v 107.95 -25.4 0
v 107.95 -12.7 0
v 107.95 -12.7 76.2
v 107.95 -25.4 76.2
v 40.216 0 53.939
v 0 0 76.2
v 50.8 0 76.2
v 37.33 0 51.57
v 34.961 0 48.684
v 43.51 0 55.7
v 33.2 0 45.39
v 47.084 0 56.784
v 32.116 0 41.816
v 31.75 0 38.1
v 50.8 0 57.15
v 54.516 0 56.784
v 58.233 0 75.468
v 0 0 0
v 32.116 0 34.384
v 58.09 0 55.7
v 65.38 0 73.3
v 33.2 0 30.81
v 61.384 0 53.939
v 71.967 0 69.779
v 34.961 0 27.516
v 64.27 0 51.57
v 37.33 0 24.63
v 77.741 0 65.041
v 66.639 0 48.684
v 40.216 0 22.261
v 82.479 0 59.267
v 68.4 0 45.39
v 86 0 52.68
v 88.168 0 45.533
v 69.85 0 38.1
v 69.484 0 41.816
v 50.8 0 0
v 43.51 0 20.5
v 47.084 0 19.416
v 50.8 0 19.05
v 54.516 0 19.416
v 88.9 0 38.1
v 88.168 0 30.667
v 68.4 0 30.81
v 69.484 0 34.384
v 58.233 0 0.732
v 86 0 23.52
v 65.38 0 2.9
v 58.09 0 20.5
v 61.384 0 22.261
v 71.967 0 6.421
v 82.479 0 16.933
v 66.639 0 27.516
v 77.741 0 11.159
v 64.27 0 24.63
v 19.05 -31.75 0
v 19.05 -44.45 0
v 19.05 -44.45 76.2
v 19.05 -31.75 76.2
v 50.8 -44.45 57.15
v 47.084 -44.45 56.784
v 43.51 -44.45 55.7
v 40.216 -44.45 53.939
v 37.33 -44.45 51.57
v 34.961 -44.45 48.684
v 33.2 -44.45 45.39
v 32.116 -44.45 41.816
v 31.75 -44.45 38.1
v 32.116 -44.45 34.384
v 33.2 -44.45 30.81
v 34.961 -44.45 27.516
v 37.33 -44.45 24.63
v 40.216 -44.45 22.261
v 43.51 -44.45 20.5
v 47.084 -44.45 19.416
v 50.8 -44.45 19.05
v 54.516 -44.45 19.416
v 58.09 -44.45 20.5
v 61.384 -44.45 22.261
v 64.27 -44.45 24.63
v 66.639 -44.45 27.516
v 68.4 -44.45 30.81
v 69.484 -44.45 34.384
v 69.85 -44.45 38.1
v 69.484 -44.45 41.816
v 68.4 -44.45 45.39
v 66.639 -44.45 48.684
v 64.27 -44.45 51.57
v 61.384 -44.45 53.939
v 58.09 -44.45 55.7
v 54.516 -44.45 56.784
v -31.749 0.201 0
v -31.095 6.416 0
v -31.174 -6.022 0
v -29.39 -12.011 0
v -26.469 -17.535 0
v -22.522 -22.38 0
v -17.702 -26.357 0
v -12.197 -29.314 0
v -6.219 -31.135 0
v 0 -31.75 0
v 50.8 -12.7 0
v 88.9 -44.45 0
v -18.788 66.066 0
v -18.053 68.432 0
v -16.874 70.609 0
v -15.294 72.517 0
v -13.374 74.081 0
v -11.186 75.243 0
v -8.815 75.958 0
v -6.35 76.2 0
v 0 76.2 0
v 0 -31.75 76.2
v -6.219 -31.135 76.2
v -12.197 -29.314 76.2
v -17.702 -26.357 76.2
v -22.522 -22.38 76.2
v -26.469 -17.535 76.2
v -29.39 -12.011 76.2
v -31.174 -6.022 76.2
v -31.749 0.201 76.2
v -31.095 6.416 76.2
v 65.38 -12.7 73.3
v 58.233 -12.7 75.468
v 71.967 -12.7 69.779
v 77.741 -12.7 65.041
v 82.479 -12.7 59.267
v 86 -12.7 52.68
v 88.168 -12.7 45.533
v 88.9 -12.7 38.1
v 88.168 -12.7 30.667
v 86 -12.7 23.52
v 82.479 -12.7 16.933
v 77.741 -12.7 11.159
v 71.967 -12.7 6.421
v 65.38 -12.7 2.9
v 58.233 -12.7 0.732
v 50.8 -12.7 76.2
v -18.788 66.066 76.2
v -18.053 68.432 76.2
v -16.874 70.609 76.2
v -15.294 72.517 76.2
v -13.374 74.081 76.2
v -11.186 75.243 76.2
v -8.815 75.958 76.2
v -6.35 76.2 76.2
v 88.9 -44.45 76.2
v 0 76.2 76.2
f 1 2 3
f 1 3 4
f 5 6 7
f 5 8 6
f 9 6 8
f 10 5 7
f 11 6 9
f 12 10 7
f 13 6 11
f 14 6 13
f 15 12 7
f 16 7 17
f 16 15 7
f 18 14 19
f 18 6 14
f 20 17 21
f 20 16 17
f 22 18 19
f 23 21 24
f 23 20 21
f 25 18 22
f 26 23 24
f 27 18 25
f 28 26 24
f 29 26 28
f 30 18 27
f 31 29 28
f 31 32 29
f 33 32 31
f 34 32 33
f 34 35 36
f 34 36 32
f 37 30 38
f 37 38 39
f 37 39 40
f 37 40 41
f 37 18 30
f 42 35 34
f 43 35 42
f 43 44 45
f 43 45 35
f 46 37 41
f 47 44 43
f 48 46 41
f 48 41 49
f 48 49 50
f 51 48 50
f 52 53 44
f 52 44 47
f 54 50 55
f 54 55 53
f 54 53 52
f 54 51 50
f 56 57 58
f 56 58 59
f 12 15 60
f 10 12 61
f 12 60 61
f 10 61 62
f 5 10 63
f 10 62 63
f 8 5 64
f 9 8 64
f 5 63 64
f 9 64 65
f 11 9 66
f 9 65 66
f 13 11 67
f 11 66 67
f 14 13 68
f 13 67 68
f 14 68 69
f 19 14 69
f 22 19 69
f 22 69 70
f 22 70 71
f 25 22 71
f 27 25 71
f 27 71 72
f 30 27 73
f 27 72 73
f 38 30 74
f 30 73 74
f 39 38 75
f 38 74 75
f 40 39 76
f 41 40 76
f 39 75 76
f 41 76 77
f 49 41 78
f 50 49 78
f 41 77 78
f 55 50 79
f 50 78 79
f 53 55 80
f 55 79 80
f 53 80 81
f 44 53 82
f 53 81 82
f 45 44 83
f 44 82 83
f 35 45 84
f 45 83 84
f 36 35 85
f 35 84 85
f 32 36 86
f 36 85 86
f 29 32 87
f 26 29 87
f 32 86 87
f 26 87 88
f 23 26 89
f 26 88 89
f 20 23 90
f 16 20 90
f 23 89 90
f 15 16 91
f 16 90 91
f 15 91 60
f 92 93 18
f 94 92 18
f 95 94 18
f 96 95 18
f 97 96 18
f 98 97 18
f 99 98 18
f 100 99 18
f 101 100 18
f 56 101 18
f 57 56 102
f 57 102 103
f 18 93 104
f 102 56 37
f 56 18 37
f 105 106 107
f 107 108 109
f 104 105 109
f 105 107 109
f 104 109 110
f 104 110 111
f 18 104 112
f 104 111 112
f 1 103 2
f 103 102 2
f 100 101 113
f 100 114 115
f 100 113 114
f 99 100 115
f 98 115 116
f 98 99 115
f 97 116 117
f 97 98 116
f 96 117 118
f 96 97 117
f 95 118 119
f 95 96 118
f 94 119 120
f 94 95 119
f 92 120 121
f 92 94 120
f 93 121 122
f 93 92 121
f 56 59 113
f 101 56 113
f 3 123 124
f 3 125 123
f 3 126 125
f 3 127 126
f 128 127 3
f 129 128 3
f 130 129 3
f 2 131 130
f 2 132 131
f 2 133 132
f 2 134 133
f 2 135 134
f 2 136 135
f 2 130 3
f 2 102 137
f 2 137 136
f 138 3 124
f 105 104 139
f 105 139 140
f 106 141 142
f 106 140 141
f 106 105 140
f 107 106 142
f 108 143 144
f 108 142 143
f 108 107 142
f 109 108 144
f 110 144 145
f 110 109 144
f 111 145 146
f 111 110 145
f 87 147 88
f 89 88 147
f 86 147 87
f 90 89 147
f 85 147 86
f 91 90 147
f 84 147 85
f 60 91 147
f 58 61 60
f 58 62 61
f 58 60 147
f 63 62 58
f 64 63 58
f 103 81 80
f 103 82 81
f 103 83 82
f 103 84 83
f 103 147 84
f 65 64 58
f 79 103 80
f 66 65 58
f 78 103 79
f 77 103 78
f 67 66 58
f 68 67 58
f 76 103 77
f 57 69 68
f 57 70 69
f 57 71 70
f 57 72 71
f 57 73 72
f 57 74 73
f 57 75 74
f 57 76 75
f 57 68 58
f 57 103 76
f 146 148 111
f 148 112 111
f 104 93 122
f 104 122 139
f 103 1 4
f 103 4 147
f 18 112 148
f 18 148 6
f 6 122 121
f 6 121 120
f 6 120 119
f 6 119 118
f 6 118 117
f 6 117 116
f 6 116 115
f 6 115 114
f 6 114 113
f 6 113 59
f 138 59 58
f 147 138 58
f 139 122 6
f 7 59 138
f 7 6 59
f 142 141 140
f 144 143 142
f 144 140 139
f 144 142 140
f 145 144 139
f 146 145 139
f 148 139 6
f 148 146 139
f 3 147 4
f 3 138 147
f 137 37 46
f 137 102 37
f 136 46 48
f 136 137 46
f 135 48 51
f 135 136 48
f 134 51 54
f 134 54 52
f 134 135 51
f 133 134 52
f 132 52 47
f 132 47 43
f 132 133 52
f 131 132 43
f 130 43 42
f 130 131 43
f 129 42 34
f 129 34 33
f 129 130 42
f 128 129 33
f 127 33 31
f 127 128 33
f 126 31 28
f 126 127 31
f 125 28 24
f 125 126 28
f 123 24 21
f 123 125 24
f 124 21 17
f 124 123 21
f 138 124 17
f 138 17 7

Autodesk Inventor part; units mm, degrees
ref_plane "YZ Plane" through (0, 0, 0) normal (1, 0, 0) x (0, 1, 0)
ref_plane "XZ Plane" through (0, 0, 0) normal (0, 1, 0) x (-1, 0, 0)
ref_plane "XY Plane" through (0, 0, 0) normal (0, 0, 1) x (1, 0, 0)
sketch "Sketch1" plane through (0, 0, 0) normal (0, 0, 1) x (1, 0, 0)
  line L0 (0, 76.2) -> (0, 0)
  line L1 (0, 0) -> (50.8, 0)
  line L2 (50.8, 0) -> (50.8, -12.7)
  line L3 (50.8, -12.7) -> (107.95, -12.7)
  line L4 (107.95, -12.7) -> (107.95, -25.4)
  line L5 (107.95, -25.4) -> (88.9, -44.45)
  line L6 (88.9, -44.45) -> (19.05, -44.45)
  line L7 (0, 76.2) -> (-6.35, 76.2)
  circle A0 centre (-6.35, 63.5) radius 12.7
  circle A1 centre (0, 0) radius 31.75
  line L8 (19.05, -44.45) -> (19.05, -31.75)
  line L9 (-31.0951, 6.4155) -> (-18.788, 66.0662)
  line L10 (19.05, -31.75) -> (0, -31.75)
  point P0 (0, 74.4985)
  dimension "d0" = 6.35
  dimension "d1" = 69.85
  dimension "d2" = 12.7
  dimension "d3" = 76.2
  dimension "d4" = 63.5
  dimension "d5" = 19.05
  dimension "d7" = 31.75
  dimension "d8" = 107.95
  dimension "d9" = 25.4
  dimension "d10" = 12.7
  dimension "d11" = 50.8
  dimension "d12" = 44.45
extrude "Extrusion1" add sketch "Sketch1" along normal blind 76.2 contours L0 A0 L7 | L0 A0 | L0 A1 L9 A0 | L0 L1 A1 | L1 L2 L3 L4 L5 L6 L8 L10 A1 picked at (-6.7952, 59.4597) picked at (-19.9789, 6.5634)
sketch "Sketch2" plane through (50.8, -12.7, 0) normal (0, 1, 0) x (1, 0, 0)
  line L0 (0, 0) -> (0, -76.2) construction
  circle A0 centre (0, -38.1) radius 38.1
  point P0 (-50.8, 0)
extrude "Extrusion2" add sketch "Sketch2" along normal up to surface (12.7 mm away)
sketch "Sketch3" plane through (0, 0, 76.2) normal (0, 1, 0) x (1, 0, 0)
  arc A0 (50.8, 0) -> (50.8, 76.2) centre (50.8, 38.1) ccw construction
  point P0 (0, 76.2)
hole "Hole1" at (50.8, 0, 38.1) direction (0, -1, 0) diameter 38.1 end through all
properties part number "ch4-3"
